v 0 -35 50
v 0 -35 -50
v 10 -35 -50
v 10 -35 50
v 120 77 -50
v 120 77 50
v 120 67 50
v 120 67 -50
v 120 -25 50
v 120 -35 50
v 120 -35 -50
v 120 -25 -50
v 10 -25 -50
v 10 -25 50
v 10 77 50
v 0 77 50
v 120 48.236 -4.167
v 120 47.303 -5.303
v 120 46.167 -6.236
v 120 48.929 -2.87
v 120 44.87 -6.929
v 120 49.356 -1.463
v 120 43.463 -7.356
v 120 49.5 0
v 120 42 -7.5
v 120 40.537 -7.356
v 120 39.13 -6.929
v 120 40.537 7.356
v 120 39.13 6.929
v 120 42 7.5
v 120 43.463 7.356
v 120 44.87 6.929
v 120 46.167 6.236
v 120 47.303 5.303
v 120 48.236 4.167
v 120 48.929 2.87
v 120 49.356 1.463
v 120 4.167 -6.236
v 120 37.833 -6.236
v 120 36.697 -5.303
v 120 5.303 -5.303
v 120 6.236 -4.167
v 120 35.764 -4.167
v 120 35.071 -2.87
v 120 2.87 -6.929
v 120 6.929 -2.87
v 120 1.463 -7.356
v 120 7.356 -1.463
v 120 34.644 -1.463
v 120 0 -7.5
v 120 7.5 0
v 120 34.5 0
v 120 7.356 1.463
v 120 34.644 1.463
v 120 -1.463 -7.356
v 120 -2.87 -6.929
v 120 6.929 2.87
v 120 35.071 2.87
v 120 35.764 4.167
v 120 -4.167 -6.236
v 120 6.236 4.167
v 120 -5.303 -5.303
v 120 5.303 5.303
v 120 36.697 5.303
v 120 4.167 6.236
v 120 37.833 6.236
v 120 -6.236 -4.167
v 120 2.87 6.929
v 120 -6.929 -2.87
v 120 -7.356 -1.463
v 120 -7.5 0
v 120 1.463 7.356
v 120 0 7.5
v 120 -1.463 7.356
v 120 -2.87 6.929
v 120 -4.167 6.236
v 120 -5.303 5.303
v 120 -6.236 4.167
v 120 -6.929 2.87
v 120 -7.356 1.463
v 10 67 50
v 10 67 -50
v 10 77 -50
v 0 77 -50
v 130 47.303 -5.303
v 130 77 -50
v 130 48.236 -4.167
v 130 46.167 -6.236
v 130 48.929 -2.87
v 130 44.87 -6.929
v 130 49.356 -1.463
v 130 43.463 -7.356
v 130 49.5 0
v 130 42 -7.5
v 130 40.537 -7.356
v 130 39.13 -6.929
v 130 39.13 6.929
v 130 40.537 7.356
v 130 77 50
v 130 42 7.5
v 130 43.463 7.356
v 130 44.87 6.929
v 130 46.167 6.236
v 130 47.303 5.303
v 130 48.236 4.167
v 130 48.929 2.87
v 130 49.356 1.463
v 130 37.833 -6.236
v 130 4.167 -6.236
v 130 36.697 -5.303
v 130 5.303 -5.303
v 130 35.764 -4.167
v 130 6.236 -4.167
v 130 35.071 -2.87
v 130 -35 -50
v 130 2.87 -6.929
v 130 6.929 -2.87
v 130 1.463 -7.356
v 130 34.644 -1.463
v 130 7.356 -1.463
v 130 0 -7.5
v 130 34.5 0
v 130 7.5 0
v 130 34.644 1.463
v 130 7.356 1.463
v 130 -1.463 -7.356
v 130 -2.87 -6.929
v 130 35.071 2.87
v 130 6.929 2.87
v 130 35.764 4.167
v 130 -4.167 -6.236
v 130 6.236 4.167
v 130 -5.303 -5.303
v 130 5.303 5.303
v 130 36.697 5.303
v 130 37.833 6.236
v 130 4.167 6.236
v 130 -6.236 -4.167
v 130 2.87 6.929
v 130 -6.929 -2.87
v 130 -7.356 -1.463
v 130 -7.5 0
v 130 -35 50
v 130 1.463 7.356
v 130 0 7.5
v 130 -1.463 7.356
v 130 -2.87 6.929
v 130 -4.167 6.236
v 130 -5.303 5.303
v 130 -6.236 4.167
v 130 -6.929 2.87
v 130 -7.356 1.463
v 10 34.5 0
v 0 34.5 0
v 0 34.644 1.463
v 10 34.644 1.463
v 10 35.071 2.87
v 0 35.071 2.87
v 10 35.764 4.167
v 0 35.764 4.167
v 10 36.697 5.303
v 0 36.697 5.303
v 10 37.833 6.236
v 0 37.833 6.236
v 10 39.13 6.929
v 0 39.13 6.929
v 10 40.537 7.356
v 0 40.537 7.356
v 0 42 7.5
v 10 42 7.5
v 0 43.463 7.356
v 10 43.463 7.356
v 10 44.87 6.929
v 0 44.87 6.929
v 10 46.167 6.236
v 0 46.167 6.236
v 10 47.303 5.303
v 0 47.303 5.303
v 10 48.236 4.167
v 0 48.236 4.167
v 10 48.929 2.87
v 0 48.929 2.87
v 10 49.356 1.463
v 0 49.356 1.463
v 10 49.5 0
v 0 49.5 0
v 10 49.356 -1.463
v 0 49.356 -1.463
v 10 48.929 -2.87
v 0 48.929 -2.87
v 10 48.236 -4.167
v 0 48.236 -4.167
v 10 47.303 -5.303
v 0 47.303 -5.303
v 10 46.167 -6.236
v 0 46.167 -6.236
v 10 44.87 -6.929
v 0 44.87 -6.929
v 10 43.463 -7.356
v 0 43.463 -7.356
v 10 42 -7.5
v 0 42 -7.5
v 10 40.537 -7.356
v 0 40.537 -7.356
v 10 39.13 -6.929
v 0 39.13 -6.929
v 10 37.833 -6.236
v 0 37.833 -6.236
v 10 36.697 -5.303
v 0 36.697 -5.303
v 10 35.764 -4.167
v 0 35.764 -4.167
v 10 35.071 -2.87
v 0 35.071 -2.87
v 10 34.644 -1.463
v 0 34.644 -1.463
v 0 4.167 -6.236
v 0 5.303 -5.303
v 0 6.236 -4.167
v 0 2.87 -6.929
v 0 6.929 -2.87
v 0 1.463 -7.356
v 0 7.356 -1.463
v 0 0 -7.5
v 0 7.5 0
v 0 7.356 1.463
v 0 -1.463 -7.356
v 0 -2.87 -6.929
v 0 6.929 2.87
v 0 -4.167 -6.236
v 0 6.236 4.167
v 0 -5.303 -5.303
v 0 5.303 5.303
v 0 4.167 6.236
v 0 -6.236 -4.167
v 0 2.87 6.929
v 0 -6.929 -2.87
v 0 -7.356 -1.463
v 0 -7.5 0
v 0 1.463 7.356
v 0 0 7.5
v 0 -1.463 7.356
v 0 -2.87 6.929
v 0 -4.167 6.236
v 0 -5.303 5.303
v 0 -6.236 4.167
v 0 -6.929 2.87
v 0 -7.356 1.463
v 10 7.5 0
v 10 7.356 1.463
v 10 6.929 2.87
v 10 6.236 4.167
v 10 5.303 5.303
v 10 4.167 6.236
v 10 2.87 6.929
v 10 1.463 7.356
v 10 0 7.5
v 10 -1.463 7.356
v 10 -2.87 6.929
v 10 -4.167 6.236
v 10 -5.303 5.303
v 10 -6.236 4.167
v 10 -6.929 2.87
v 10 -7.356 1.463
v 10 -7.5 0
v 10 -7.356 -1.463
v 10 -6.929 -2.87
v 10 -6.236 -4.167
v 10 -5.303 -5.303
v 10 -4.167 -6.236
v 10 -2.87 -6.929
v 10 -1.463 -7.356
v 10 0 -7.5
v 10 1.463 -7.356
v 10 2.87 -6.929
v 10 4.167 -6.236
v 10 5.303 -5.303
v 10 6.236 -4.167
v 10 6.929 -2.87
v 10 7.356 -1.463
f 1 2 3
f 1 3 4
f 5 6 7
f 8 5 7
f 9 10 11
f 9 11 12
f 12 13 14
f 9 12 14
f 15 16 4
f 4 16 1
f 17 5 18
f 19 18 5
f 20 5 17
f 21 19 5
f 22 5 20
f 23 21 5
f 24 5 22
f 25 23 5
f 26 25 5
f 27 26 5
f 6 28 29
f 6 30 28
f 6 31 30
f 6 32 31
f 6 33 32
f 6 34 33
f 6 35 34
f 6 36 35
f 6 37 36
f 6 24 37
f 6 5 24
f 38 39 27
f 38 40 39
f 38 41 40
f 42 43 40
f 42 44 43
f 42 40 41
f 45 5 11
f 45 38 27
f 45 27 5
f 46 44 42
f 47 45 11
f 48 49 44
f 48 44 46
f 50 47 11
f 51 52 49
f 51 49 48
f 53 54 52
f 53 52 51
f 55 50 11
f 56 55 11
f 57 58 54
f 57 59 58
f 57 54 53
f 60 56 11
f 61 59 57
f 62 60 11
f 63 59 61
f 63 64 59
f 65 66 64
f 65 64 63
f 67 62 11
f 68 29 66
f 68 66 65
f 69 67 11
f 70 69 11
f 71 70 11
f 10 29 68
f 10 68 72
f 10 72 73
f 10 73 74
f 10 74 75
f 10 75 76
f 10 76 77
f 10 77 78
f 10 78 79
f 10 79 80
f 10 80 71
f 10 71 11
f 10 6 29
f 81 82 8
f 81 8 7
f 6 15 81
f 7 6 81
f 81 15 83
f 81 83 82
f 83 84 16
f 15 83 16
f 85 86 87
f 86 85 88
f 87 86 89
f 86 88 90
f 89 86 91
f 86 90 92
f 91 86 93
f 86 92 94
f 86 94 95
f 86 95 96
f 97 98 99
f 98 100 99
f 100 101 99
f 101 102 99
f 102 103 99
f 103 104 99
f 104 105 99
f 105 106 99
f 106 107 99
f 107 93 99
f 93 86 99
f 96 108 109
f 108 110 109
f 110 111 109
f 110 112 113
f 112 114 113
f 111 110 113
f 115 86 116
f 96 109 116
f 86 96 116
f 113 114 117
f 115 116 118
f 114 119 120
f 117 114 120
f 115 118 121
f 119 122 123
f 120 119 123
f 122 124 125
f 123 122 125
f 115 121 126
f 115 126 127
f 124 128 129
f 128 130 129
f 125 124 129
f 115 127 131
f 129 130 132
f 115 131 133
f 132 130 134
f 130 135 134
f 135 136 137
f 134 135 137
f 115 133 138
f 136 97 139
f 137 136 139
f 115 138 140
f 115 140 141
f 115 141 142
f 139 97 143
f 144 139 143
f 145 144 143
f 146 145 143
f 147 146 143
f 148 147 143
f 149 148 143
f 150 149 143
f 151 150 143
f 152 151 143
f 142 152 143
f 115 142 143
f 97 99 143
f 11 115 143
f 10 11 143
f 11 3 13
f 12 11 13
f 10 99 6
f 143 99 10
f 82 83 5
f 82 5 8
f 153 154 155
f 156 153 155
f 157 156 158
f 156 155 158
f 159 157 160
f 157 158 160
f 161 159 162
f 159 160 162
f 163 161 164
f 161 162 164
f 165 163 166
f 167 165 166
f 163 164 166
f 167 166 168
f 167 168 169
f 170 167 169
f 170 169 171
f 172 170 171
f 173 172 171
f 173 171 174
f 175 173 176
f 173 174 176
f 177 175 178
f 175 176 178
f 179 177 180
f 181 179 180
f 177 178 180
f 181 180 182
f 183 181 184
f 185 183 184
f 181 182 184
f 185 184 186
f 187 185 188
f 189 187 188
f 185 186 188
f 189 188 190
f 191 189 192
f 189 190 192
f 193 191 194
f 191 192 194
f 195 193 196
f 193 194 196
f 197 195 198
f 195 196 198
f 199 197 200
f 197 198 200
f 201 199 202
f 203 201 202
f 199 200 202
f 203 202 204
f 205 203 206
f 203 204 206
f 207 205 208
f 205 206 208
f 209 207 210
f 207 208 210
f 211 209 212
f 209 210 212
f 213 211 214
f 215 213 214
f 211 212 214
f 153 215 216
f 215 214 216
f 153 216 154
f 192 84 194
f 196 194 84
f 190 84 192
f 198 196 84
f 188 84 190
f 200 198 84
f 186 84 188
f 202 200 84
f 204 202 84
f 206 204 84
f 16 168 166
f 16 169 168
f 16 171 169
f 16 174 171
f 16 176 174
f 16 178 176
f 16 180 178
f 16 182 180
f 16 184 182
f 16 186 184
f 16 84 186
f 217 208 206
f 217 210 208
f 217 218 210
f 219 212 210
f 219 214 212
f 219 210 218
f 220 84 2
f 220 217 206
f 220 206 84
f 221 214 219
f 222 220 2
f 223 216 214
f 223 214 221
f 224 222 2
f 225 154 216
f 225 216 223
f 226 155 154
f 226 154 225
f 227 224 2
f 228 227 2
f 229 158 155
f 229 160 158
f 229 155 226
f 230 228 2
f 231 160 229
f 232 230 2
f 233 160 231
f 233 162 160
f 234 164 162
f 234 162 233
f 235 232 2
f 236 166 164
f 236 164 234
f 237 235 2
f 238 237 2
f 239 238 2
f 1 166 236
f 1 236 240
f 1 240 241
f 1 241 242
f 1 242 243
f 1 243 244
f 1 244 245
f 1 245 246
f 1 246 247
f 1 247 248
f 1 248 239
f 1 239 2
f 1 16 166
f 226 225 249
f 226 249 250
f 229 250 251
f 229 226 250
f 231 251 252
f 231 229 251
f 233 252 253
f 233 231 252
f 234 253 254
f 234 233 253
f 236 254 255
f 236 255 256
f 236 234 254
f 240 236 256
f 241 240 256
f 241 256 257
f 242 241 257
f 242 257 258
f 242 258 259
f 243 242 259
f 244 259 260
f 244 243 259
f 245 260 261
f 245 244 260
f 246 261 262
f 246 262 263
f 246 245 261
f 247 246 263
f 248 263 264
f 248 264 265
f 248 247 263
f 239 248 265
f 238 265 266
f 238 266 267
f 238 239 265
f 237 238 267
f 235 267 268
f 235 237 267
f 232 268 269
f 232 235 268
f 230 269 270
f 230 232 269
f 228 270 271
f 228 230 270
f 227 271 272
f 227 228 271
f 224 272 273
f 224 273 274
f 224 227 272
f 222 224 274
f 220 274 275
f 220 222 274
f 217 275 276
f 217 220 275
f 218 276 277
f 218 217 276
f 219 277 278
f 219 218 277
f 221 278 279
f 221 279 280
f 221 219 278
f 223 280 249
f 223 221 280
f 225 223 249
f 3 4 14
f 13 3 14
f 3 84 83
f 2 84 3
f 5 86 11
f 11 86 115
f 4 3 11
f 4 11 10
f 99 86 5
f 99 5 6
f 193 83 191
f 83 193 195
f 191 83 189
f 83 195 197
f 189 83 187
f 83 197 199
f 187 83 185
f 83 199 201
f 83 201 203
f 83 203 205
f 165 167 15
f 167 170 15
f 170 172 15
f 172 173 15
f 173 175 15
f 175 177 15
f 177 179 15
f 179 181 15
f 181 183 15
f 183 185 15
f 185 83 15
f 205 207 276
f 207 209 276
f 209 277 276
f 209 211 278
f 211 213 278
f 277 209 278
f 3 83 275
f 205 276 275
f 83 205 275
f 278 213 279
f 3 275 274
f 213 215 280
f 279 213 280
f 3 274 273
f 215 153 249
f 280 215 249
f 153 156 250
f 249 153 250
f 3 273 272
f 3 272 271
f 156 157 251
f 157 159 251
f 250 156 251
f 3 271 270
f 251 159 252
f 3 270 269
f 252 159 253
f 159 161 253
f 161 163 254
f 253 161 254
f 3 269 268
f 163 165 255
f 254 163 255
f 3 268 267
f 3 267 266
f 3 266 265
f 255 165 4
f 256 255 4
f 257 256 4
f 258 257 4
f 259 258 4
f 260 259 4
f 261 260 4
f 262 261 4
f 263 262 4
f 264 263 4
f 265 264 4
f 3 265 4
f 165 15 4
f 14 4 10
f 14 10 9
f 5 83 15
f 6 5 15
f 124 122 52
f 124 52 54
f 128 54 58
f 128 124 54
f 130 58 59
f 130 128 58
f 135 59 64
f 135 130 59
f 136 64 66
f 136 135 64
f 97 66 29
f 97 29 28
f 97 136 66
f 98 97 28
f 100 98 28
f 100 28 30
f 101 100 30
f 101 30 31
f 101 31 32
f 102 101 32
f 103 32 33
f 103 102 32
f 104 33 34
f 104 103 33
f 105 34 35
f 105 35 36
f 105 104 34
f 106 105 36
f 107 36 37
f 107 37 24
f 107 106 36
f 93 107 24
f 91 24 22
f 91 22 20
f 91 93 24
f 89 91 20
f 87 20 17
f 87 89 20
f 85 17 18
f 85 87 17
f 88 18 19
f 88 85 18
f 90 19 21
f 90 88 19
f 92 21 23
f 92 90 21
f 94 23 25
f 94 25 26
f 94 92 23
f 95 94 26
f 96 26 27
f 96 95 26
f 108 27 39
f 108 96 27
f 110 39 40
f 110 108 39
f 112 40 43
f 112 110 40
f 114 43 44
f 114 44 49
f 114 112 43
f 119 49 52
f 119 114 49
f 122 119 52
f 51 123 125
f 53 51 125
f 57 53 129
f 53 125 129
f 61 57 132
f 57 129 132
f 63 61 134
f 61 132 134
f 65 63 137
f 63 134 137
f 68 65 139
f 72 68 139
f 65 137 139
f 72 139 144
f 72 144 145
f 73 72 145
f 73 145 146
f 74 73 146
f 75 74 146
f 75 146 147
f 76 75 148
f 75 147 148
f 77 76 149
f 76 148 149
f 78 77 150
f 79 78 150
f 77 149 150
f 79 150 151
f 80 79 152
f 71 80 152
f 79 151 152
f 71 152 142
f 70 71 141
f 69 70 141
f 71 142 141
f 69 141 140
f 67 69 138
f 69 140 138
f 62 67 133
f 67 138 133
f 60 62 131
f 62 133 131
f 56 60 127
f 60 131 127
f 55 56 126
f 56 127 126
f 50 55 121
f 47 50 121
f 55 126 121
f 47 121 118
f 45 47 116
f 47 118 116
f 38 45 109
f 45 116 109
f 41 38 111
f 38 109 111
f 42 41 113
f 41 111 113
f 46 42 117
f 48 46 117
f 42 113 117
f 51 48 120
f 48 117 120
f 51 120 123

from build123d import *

# Parameters (mm, degrees)
F0_W     = 56
F0_H     = 100
F0_R     = 7.5
F1_DEPTH = 10
F3_W     = 10
F3_H     = 100
F4_DEPTH = 110


with BuildPart() as f1:
    # F0 (on Right) → F1 (new body)
    with BuildSketch(Plane.YZ):
        with Locations((-7, 0)):
            Rectangle(F0_W, F0_H)
        Circle(F0_R, mode=Mode.SUBTRACT)
    extrude(amount=F1_DEPTH)

    # F2: F1 across face


with BuildPart() as f1_1:
    add(f1.part)
    add(f1.part.mirror(Plane(origin=(5, 21, 0), x_dir=(-1, 0, 0), z_dir=(0, 1, 0))))


with BuildPart() as f4:
    # F3 (on face) → F4 (new body)
    with BuildSketch(Plane.YZ.offset(10)):
        with Locations((-30, 0)):
            Rectangle(F3_W, F3_H)
    extrude(amount=F4_DEPTH)


with BuildPart() as f6_1:
    # F6: instance of F4
    add(f4.part.mirror(Plane(origin=(5, 21, 0), x_dir=(-1, 0, 0), z_dir=(0, 1, 0))))


with BuildPart() as f8_1:
    # F8: instance of F1
    add(f1_1.part.mirror(Plane(origin=(65, -4.5, 0), x_dir=(0, 1, 0), z_dir=(1, 0, 0))))


solid = Compound([f1_1.part, f4.part, f6_1.part, f8_1.part])
